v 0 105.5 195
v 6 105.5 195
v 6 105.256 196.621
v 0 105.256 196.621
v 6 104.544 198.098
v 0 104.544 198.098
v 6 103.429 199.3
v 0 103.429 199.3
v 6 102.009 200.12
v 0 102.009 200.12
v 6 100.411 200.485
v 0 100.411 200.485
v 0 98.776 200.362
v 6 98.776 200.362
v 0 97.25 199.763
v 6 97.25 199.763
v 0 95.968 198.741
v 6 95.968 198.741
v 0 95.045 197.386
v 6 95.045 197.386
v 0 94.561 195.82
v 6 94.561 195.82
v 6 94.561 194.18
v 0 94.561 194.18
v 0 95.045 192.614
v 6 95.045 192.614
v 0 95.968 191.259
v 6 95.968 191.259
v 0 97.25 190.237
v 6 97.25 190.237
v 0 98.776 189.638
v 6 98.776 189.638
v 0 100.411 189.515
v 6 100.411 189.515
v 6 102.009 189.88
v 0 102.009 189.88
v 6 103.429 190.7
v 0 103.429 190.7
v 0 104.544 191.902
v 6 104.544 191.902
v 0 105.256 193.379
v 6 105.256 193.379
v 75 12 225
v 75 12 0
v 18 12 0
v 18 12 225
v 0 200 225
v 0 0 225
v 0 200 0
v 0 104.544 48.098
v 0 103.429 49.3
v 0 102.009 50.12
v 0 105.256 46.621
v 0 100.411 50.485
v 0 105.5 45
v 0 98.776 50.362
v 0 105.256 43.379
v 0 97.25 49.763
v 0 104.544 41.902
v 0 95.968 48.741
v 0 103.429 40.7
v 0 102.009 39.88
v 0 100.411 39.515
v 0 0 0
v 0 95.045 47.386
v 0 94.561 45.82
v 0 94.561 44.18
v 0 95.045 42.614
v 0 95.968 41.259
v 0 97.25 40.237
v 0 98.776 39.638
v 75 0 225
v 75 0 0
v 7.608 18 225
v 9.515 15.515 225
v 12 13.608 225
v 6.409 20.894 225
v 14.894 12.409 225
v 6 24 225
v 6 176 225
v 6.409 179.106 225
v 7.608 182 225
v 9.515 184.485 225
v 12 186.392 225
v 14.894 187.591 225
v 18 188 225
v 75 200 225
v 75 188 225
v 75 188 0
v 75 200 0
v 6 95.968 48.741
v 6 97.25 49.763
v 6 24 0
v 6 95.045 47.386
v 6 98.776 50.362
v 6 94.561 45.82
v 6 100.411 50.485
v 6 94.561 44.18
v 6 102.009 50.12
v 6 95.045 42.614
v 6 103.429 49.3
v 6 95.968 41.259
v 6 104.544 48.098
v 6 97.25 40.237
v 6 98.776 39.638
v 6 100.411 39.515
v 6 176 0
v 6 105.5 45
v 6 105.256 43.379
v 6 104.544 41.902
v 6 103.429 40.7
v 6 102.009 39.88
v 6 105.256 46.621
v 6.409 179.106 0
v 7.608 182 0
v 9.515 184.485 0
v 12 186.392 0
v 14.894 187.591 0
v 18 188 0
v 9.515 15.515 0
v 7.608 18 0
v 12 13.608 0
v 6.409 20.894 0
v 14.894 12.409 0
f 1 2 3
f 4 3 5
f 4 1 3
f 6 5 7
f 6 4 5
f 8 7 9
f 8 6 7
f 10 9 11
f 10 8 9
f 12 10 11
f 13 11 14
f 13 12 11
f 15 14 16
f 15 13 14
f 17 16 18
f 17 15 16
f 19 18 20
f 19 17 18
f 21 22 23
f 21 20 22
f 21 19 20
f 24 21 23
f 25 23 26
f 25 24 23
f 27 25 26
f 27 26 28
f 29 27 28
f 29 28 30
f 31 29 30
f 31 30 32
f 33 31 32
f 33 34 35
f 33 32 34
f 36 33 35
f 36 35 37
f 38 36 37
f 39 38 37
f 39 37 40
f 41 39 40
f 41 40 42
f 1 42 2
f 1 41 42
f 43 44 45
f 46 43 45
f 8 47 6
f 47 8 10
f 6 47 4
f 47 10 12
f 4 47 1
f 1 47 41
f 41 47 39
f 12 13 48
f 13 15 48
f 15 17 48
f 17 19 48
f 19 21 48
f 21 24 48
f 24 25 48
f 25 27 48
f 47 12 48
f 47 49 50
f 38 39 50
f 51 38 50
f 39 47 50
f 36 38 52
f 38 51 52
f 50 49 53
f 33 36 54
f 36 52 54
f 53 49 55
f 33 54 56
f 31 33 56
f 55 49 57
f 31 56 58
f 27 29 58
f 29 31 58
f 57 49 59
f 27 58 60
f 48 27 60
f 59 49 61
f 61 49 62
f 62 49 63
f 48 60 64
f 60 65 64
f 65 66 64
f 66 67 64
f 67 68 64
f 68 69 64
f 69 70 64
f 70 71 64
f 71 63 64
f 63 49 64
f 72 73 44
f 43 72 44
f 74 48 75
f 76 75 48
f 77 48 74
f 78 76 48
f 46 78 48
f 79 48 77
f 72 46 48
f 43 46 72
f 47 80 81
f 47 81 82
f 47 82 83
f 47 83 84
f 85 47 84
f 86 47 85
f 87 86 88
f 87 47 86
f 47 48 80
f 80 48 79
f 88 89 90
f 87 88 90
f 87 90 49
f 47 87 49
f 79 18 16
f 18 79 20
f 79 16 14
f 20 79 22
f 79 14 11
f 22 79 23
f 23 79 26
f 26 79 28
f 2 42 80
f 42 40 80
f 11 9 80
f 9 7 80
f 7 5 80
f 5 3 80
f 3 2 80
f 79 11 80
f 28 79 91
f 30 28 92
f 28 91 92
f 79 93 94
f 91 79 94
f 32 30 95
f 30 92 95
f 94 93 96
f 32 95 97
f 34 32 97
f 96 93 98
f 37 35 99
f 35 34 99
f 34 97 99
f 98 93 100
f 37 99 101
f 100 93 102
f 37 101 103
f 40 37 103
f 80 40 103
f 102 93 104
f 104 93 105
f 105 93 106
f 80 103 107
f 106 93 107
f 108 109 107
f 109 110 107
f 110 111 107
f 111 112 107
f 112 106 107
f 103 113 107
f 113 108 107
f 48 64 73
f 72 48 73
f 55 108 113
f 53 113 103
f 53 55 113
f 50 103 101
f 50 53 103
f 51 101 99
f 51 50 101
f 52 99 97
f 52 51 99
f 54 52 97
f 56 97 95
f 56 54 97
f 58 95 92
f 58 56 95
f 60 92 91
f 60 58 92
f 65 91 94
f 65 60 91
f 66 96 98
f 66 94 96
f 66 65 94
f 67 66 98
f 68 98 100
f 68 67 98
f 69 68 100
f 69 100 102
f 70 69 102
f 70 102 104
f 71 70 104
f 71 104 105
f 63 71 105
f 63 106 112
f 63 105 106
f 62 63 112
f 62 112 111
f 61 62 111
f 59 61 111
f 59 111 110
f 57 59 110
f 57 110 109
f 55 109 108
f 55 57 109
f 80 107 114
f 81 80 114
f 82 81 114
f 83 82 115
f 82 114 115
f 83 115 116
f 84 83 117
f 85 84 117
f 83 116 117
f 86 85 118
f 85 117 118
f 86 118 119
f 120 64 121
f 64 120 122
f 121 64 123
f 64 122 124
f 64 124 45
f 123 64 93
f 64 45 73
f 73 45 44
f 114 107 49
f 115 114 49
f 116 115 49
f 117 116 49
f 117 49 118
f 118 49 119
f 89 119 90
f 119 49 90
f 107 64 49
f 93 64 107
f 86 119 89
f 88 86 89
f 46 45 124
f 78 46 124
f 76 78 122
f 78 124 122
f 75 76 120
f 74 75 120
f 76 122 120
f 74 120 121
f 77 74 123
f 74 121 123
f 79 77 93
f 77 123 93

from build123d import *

# Parameters (mm, degrees)
F1_DEPTH = 225
F2_R     = 5.5
F3_DEPTH = 75.001


with BuildPart() as f1:
    # F0 (on Top) → F1 (new body)
    with BuildSketch(Plane.XY):
        with BuildLine():
            Line((0, 200), (0, 0))
            Line((0, 0), (75, 0))
            Line((75, 0), (75, 12))
            Line((75, 12), (18, 12))
            ThreePointArc((18, 12), (9.514719, 15.514719), (6, 24))
            Line((6, 24), (6, 176))
            ThreePointArc((6, 176), (9.514719, 184.485281), (18, 188))
            Line((18, 188), (75, 188))
            Line((75, 188), (75, 200))
            Line((75, 200), (0, 200))
        make_face()
    extrude(amount=F1_DEPTH)

    # F2 (on Right) → F3 (cut, through all)
    with BuildSketch(Plane.YZ):
        with Locations((100, 195)):
            Circle(F2_R)
        with Locations((100, 45)):
            Circle(F2_R)
    extrude(amount=F3_DEPTH, mode=Mode.SUBTRACT)


solid = f1.part
